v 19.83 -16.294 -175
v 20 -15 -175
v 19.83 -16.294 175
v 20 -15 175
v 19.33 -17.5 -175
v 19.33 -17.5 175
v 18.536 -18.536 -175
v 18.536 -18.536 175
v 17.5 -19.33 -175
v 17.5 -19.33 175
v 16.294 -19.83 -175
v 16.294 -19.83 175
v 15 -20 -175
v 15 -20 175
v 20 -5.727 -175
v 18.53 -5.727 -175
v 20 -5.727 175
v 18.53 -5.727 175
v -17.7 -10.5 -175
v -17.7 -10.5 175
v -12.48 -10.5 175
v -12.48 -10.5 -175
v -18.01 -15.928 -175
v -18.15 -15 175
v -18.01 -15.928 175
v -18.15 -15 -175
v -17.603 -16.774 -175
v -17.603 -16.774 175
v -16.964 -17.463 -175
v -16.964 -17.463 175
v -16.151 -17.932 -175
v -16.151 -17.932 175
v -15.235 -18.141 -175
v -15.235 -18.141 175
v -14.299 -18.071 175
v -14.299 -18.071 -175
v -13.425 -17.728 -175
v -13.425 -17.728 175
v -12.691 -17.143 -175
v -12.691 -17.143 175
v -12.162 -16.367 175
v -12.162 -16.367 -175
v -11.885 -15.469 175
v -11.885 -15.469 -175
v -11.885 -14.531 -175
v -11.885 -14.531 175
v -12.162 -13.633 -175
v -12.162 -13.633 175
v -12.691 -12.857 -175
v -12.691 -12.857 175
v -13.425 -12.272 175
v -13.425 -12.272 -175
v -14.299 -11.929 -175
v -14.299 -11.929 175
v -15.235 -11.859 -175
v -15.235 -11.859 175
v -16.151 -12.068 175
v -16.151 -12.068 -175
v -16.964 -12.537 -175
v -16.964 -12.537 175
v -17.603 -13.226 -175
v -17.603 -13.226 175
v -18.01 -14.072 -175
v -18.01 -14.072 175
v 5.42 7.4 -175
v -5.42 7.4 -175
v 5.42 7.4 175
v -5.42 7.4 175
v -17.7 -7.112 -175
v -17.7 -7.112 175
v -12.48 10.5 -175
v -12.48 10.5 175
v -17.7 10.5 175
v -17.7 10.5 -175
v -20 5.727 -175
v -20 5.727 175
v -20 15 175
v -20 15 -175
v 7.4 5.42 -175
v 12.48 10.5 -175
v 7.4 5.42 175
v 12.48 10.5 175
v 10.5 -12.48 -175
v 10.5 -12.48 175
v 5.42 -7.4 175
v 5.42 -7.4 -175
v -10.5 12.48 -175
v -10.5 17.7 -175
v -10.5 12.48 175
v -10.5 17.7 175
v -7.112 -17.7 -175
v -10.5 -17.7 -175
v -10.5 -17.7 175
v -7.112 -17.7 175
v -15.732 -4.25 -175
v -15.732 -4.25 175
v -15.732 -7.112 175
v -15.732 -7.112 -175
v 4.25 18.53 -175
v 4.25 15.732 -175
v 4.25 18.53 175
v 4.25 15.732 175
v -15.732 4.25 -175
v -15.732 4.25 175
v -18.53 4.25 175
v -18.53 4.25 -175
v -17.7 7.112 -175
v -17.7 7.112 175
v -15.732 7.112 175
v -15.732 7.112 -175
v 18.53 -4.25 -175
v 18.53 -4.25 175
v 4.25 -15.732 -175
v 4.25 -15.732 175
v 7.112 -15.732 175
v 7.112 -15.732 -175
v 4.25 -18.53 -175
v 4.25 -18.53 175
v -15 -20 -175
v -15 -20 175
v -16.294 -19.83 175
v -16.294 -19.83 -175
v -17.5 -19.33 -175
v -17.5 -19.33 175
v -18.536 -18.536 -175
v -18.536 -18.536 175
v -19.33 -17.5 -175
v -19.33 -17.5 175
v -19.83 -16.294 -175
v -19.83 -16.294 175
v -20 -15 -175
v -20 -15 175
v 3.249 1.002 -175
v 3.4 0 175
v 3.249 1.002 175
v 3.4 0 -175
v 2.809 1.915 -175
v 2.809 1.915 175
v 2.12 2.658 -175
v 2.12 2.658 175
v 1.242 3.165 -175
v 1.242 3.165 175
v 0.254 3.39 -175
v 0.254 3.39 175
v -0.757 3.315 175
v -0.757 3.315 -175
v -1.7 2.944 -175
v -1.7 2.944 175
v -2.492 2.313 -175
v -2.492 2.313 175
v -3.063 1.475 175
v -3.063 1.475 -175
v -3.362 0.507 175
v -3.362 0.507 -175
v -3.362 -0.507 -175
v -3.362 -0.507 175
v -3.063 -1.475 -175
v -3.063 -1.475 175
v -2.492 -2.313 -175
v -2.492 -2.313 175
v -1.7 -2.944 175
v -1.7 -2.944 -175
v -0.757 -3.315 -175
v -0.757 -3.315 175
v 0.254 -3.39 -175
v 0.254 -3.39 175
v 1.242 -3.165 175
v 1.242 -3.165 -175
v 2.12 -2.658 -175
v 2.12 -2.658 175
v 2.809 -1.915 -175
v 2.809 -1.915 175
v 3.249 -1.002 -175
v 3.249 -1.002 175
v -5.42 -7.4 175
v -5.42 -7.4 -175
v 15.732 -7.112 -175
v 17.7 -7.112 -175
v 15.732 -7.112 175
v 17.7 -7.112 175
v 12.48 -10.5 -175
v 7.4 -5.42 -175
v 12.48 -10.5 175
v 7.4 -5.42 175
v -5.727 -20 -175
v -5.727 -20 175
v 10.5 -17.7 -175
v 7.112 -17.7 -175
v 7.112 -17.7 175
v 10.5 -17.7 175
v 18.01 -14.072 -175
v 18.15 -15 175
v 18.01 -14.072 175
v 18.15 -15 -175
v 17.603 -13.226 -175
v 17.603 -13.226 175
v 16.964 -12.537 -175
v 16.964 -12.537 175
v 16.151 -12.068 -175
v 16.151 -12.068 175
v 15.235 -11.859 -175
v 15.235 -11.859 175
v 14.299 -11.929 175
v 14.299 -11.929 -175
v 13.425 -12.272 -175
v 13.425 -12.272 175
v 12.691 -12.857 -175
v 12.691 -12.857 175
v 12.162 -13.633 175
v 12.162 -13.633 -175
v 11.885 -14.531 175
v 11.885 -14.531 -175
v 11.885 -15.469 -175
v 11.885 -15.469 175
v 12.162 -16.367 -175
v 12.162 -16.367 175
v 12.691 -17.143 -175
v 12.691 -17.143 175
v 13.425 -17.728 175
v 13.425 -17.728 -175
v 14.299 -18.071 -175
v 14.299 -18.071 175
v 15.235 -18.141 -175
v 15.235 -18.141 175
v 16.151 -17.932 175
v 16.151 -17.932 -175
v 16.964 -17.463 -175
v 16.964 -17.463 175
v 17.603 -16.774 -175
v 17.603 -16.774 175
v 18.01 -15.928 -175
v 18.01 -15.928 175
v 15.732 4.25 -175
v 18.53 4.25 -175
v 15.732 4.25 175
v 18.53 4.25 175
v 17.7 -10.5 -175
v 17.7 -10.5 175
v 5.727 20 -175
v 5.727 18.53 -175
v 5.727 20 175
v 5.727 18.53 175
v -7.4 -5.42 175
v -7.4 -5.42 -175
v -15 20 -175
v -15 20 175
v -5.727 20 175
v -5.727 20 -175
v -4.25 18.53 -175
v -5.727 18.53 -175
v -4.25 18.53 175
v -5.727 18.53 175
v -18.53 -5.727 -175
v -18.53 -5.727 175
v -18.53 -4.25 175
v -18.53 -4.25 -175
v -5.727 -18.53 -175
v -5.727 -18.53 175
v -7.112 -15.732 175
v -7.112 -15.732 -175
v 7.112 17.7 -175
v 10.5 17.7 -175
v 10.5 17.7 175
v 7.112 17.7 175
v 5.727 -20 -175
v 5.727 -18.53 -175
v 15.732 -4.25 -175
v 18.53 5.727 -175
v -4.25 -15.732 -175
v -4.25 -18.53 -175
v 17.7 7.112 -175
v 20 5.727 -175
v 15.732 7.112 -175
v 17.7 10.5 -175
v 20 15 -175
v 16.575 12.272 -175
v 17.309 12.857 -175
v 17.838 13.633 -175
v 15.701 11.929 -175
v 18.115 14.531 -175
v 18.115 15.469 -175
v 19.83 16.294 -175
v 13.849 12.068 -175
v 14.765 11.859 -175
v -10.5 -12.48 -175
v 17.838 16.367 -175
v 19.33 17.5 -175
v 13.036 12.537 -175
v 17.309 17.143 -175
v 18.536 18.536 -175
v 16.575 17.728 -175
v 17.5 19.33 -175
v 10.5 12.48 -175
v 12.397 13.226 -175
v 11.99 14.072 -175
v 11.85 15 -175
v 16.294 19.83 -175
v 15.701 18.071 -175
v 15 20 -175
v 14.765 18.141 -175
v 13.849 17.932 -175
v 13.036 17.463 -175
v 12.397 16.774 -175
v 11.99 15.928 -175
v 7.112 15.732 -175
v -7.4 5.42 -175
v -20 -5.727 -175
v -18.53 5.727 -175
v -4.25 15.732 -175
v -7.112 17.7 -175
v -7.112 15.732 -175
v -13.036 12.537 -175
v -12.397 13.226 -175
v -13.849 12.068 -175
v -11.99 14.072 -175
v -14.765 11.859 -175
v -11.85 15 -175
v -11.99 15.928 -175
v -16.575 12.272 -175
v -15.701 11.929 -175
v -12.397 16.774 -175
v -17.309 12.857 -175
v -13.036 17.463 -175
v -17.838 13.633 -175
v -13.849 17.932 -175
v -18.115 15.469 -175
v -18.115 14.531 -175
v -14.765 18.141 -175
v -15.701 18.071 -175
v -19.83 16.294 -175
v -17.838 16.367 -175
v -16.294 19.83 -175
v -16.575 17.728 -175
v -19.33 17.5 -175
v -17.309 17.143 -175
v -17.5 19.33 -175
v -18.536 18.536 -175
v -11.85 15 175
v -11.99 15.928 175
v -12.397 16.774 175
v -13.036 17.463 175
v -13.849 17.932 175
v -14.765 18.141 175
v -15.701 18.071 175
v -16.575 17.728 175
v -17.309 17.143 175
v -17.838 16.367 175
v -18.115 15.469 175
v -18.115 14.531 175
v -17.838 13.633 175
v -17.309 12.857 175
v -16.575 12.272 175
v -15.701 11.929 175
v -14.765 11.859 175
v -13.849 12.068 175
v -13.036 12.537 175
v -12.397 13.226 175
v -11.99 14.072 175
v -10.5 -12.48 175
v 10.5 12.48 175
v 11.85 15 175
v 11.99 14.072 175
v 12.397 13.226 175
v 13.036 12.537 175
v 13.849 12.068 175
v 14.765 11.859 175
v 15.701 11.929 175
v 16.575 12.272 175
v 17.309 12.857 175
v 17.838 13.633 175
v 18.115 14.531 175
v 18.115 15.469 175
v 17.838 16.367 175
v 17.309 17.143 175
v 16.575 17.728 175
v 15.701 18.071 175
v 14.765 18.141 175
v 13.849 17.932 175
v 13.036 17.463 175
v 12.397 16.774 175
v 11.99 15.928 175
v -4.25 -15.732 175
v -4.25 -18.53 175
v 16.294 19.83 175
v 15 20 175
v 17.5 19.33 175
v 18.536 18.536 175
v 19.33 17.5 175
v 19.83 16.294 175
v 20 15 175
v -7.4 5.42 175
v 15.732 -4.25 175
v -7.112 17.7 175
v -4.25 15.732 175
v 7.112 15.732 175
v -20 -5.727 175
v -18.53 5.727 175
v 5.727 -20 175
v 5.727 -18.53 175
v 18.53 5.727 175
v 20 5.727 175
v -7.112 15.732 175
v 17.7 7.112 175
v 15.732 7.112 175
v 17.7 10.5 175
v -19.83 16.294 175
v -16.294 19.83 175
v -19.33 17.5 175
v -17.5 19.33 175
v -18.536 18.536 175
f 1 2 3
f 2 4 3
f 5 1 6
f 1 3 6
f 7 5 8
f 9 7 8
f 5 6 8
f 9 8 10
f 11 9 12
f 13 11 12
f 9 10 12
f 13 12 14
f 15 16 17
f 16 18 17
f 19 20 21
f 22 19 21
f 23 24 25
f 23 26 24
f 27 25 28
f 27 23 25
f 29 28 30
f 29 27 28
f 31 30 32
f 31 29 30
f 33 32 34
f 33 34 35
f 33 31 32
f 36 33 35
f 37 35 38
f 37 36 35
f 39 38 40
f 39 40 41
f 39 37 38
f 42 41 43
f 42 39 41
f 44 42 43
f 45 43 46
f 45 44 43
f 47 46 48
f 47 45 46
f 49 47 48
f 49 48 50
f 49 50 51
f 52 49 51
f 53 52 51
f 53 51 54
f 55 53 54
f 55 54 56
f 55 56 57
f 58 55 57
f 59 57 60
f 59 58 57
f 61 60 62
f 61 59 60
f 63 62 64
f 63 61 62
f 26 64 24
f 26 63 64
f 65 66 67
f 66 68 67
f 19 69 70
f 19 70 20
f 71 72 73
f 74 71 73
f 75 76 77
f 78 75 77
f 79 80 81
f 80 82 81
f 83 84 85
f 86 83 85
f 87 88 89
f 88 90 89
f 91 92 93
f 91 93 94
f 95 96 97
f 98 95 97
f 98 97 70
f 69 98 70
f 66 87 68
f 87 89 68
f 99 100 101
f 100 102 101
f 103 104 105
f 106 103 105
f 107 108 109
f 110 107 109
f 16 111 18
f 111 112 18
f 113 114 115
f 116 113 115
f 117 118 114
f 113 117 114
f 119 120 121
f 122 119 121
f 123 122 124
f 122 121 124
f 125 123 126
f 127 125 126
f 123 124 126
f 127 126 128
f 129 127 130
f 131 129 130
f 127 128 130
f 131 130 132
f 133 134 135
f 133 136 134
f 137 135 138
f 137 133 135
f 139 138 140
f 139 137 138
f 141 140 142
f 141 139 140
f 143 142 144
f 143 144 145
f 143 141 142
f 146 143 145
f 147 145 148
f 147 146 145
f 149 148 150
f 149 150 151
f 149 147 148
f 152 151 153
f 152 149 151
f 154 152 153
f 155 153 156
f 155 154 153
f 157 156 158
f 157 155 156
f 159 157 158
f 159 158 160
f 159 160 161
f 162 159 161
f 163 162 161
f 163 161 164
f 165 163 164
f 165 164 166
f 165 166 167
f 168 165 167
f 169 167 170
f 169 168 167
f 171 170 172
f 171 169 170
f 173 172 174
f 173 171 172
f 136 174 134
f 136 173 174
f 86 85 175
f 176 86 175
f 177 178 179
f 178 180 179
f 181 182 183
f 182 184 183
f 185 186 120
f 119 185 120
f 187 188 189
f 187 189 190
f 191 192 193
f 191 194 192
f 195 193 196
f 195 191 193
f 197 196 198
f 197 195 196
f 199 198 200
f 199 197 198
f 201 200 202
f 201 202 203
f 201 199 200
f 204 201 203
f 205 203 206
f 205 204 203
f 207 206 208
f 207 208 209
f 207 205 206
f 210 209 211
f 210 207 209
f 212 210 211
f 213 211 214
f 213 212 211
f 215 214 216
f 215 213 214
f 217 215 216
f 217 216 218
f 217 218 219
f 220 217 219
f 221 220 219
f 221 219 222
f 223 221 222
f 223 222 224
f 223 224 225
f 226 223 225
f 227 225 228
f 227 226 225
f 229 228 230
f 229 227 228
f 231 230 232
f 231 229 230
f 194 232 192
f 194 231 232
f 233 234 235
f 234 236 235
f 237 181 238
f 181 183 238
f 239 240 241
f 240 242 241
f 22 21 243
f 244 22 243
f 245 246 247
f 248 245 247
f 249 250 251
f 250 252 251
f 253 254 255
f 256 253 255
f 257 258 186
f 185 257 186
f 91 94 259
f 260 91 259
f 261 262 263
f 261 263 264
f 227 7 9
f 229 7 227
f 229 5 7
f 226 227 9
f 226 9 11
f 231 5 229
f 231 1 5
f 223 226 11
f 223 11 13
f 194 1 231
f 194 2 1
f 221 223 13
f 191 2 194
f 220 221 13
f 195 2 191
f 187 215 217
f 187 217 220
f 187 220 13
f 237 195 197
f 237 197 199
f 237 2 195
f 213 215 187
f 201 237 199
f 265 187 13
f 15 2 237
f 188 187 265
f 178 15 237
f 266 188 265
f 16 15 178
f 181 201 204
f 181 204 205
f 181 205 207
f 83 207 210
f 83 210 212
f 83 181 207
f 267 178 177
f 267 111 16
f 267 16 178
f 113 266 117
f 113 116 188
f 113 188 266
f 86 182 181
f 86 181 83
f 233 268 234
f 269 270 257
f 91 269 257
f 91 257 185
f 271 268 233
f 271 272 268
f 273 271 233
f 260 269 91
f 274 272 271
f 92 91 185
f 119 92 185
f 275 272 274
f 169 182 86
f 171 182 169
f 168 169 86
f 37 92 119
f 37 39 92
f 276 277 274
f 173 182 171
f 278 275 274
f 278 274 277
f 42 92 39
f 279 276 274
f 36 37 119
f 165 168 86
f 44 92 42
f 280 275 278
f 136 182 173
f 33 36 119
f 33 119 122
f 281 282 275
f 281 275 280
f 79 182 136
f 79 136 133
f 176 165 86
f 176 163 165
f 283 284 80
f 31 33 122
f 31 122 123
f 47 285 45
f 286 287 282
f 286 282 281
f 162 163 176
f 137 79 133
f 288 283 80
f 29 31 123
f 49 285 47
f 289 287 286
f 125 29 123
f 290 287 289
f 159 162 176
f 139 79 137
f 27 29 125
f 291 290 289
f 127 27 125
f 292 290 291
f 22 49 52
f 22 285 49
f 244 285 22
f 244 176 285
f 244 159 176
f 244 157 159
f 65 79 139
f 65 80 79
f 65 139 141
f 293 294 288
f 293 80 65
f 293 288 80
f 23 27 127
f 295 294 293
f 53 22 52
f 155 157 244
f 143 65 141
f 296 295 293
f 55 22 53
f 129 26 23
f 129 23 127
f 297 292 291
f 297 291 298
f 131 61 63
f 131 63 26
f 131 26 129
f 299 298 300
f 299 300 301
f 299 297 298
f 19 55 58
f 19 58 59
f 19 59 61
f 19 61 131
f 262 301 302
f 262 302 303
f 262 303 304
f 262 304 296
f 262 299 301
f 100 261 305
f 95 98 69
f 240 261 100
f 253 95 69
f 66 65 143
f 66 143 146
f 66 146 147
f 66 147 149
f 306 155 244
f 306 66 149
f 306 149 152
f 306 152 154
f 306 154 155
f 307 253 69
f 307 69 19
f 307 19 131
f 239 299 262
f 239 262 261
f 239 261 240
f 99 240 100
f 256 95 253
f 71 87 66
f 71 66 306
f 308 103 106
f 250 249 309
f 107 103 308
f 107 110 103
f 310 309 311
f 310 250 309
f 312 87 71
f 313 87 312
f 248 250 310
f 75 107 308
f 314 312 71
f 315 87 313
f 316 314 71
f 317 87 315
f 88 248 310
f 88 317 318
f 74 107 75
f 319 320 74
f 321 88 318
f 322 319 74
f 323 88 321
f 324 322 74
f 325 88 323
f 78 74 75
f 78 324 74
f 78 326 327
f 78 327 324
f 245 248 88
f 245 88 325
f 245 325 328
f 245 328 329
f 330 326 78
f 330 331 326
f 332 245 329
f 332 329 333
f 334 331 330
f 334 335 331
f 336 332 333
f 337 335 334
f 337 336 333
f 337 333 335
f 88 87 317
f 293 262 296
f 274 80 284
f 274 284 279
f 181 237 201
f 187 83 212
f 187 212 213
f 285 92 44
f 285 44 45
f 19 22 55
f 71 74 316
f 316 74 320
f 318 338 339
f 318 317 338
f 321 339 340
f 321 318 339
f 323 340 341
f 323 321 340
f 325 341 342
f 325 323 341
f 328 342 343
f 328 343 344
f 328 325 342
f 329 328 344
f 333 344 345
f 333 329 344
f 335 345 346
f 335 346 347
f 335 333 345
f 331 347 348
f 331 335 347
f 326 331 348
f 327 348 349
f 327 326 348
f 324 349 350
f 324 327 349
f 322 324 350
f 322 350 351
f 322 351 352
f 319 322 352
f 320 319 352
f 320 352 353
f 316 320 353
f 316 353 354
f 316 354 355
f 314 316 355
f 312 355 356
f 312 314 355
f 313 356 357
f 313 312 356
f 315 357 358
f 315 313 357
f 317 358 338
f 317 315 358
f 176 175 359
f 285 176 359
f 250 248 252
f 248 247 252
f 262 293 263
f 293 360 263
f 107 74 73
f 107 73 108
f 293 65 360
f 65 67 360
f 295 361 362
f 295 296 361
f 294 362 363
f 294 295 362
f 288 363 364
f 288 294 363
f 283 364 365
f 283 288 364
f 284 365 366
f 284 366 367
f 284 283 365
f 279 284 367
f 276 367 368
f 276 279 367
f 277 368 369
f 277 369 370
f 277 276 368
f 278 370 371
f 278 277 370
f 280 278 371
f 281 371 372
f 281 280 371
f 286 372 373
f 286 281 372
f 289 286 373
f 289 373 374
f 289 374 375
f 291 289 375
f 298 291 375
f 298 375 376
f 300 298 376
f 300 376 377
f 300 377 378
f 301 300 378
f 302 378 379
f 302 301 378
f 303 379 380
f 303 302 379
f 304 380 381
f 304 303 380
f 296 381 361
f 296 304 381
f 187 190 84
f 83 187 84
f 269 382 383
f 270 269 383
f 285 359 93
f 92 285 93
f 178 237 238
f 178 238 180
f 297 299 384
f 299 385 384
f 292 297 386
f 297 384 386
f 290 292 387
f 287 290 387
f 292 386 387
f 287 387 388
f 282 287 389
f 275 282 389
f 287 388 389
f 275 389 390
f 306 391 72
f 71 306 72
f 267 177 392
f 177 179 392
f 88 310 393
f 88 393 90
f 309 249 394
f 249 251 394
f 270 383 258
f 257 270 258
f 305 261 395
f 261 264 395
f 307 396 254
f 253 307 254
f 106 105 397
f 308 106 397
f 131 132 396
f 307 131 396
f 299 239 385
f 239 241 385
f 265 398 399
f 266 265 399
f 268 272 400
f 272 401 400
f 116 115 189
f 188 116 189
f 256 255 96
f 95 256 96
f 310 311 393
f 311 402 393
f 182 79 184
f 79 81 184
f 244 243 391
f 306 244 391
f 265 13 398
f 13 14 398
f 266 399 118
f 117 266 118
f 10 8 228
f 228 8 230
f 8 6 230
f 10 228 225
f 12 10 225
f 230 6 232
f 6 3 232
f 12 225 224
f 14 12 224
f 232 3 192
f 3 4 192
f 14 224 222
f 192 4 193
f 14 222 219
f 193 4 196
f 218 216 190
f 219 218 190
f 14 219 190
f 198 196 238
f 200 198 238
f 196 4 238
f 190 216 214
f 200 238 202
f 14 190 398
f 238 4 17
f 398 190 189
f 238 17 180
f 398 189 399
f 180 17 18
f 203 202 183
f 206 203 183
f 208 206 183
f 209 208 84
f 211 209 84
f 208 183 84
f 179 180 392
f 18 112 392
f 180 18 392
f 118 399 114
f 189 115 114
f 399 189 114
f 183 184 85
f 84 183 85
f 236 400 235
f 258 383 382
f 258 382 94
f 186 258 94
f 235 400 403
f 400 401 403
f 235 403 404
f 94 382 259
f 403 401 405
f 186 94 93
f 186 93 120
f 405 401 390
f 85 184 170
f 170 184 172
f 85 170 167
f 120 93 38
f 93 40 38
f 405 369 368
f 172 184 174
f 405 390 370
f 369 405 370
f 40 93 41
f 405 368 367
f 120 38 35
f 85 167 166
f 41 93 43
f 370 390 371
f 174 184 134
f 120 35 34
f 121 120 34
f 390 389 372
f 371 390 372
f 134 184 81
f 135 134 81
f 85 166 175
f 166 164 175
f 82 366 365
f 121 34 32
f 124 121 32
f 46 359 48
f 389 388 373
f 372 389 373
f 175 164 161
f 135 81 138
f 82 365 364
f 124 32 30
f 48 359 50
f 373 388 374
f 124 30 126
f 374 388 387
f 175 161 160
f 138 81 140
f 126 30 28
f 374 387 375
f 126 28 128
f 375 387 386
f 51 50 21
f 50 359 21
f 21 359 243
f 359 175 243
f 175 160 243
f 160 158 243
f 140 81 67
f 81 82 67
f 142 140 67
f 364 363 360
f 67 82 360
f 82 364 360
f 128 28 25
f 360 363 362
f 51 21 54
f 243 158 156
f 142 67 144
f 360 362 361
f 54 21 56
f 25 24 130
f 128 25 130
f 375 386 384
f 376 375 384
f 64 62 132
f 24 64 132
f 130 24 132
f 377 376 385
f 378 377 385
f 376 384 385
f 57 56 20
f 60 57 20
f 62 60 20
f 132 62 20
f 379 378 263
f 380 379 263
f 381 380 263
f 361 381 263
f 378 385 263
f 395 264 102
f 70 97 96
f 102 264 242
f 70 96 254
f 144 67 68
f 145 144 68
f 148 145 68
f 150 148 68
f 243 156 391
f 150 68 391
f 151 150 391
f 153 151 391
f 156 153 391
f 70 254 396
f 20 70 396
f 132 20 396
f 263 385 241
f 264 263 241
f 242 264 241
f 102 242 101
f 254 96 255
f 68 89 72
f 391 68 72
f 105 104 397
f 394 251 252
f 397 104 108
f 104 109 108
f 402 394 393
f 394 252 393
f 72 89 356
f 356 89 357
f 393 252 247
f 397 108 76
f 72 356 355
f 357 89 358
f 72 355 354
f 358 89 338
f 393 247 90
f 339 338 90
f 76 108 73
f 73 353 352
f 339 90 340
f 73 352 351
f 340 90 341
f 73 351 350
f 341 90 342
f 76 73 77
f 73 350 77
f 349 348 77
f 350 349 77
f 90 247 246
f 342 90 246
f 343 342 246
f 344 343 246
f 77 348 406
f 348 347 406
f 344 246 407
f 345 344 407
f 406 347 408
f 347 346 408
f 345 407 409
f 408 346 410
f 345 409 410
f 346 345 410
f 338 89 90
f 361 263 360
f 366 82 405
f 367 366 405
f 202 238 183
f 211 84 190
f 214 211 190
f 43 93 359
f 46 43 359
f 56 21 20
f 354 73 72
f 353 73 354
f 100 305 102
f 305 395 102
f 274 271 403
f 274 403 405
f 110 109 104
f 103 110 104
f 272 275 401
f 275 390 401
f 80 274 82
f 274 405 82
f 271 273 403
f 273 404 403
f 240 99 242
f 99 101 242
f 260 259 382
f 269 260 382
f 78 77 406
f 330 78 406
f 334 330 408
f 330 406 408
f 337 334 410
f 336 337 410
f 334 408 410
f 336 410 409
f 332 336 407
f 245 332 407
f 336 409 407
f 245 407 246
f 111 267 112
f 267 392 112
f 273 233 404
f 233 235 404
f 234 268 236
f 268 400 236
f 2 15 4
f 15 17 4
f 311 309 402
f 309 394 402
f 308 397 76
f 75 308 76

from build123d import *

# Parameters (mm, degrees)
SKETCH_1_R      = 3.4
SKETCH_1_R_2    = 3.15
EXTRUDE_1_DEPTH = 175


with BuildPart() as part:
    # Эскиз1 → Бобышка-Вытянуть1 (new, symmetric)
    with BuildSketch(Plane.XY):
        with BuildLine():
            Line((-15, 20), (-5.727351849, 20))
            Line((-5.727351849, 20), (-5.727351849, 18.530416438))
            Line((-5.727351849, 18.530416438), (-4.25, 18.530416438))
            Line((-4.25, 18.530416438), (-4.25, 15.732027397))
            Line((-4.25, 15.732027397), (-7.111831817, 15.732027397))
            Line((-7.111831817, 15.732027397), (-7.111831817, 17.7))
            Line((-7.111831817, 17.7), (-10.5, 17.7))
            Line((-10.5, 17.7), (-10.5, 12.479898987))
            Line((-10.5, 12.479898987), (-5.420101013, 7.4))
            Line((-5.420101013, 7.4), (5.420101013, 7.4))
            Line((5.420101013, 7.4), (10.5, 12.479898987))
            Line((10.5, 12.479898987), (10.5, 17.7))
            Line((10.5, 17.7), (7.111831817, 17.7))
            Line((7.111831817, 17.7), (7.111831817, 15.732027397))
            Line((7.111831817, 15.732027397), (4.25, 15.732027397))
            Line((4.25, 15.732027397), (4.25, 18.530416438))
            Line((4.25, 18.530416438), (5.727351849, 18.530416438))
            Line((5.727351849, 18.530416438), (5.727351849, 20))
            Line((5.727351849, 20), (15, 20))
            ThreePointArc((15, 20), (18.535533906, 18.535533906), (20, 15))
            Line((20, 15), (20, 5.727351849))
            Line((20, 5.727351849), (18.530416438, 5.727351849))
            Line((18.530416438, 5.727351849), (18.530416438, 4.25))
            Line((18.530416438, 4.25), (15.732027397, 4.25))
            Line((15.732027397, 4.25), (15.732027397, 7.111831817))
            Line((15.732027397, 7.111831817), (17.7, 7.111831817))
            Line((17.7, 7.111831817), (17.7, 10.5))
            Line((17.7, 10.5), (12.479898987, 10.5))
            Line((12.479898987, 10.5), (7.4, 5.420101013))
            Line((7.4, 5.420101013), (7.4, -5.420101013))
            Line((7.4, -5.420101013), (12.479898987, -10.5))
            Line((12.479898987, -10.5), (17.7, -10.5))
            Line((17.7, -10.5), (17.7, -7.111831817))
            Line((17.7, -7.111831817), (15.732027397, -7.111831817))
            Line((15.732027397, -7.111831817), (15.732027397, -4.25))
            Line((15.732027397, -4.25), (18.530416438, -4.25))
            Line((18.530416438, -4.25), (18.530416438, -5.727351849))
            Line((18.530416438, -5.727351849), (20, -5.727351849))
            Line((20, -5.727351849), (20, -15))
            ThreePointArc((20, -15), (18.535533906, -18.535533906), (15, -20))
            Line((15, -20), (5.727351849, -20))
            Line((5.727351849, -20), (5.727351849, -18.530416438))
            Line((5.727351849, -18.530416438), (4.25, -18.530416438))
            Line((4.25, -18.530416438), (4.25, -15.732027397))
            Line((4.25, -15.732027397), (7.111831817, -15.732027397))
            Line((7.111831817, -15.732027397), (7.111831817, -17.7))
            Line((7.111831817, -17.7), (10.5, -17.7))
            Line((10.5, -17.7), (10.5, -12.479898987))
            Line((10.5, -12.479898987), (5.420101013, -7.4))
            Line((5.420101013, -7.4), (-5.420101013, -7.4))
            Line((-5.420101013, -7.4), (-10.5, -12.479898987))
            Line((-10.5, -12.479898987), (-10.5, -17.7))
            Line((-10.5, -17.7), (-7.111831817, -17.7))
            Line((-7.111831817, -17.7), (-7.111831817, -15.732027397))
            Line((-7.111831817, -15.732027397), (-4.25, -15.732027397))
            Line((-4.25, -15.732027397), (-4.25, -18.530416438))
            Line((-4.25, -18.530416438), (-5.727351849, -18.530416438))
            Line((-5.727351849, -18.530416438), (-5.727351849, -20))
            Line((-5.727351849, -20), (-15, -20))
            ThreePointArc((-15, -20), (-18.535533906, -18.535533906), (-20, -15))
            Line((-20, -15), (-20, -5.727351849))
            Line((-20, -5.727351849), (-18.530416438, -5.727351849))
            Line((-18.530416438, -5.727351849), (-18.530416438, -4.25))
            Line((-18.530416438, -4.25), (-15.732027397, -4.25))
            Line((-15.732027397, -4.25), (-15.732027397, -7.111831817))
            Line((-15.732027397, -7.111831817), (-17.7, -7.111831817))
            Line((-17.7, -7.111831817), (-17.7, -10.5))
            Line((-17.7, -10.5), (-12.479898987, -10.5))
            Line((-12.479898987, -10.5), (-7.4, -5.420101013))
            Line((-7.4, -5.420101013), (-7.4, 5.420101013))
            Line((-7.4, 5.420101013), (-12.479898987, 10.5))
            Line((-12.479898987, 10.5), (-17.7, 10.5))
            Line((-17.7, 10.5), (-17.7, 7.111831817))
            Line((-17.7, 7.111831817), (-15.732027397, 7.111831817))
            Line((-15.732027397, 7.111831817), (-15.732027397, 4.25))
            Line((-15.732027397, 4.25), (-18.530416438, 4.25))
            Line((-18.530416438, 4.25), (-18.530416438, 5.727351849))
            Line((-18.530416438, 5.727351849), (-20, 5.727351849))
            Line((-20, 5.727351849), (-20, 15))
            ThreePointArc((-20, 15), (-18.535533906, 18.535533906), (-15, 20))
        make_face()
        Circle(SKETCH_1_R, mode=Mode.SUBTRACT)
        with Locations((-15, 15)):
            Circle(SKETCH_1_R_2, mode=Mode.SUBTRACT)
        with Locations((15, 15)):
            Circle(SKETCH_1_R_2, mode=Mode.SUBTRACT)
        with Locations((15, -15)):
            Circle(SKETCH_1_R_2, mode=Mode.SUBTRACT)
        with Locations((-15, -15)):
            Circle(SKETCH_1_R_2, mode=Mode.SUBTRACT)
    extrude(amount=EXTRUDE_1_DEPTH, both=True)


solid = part.part
